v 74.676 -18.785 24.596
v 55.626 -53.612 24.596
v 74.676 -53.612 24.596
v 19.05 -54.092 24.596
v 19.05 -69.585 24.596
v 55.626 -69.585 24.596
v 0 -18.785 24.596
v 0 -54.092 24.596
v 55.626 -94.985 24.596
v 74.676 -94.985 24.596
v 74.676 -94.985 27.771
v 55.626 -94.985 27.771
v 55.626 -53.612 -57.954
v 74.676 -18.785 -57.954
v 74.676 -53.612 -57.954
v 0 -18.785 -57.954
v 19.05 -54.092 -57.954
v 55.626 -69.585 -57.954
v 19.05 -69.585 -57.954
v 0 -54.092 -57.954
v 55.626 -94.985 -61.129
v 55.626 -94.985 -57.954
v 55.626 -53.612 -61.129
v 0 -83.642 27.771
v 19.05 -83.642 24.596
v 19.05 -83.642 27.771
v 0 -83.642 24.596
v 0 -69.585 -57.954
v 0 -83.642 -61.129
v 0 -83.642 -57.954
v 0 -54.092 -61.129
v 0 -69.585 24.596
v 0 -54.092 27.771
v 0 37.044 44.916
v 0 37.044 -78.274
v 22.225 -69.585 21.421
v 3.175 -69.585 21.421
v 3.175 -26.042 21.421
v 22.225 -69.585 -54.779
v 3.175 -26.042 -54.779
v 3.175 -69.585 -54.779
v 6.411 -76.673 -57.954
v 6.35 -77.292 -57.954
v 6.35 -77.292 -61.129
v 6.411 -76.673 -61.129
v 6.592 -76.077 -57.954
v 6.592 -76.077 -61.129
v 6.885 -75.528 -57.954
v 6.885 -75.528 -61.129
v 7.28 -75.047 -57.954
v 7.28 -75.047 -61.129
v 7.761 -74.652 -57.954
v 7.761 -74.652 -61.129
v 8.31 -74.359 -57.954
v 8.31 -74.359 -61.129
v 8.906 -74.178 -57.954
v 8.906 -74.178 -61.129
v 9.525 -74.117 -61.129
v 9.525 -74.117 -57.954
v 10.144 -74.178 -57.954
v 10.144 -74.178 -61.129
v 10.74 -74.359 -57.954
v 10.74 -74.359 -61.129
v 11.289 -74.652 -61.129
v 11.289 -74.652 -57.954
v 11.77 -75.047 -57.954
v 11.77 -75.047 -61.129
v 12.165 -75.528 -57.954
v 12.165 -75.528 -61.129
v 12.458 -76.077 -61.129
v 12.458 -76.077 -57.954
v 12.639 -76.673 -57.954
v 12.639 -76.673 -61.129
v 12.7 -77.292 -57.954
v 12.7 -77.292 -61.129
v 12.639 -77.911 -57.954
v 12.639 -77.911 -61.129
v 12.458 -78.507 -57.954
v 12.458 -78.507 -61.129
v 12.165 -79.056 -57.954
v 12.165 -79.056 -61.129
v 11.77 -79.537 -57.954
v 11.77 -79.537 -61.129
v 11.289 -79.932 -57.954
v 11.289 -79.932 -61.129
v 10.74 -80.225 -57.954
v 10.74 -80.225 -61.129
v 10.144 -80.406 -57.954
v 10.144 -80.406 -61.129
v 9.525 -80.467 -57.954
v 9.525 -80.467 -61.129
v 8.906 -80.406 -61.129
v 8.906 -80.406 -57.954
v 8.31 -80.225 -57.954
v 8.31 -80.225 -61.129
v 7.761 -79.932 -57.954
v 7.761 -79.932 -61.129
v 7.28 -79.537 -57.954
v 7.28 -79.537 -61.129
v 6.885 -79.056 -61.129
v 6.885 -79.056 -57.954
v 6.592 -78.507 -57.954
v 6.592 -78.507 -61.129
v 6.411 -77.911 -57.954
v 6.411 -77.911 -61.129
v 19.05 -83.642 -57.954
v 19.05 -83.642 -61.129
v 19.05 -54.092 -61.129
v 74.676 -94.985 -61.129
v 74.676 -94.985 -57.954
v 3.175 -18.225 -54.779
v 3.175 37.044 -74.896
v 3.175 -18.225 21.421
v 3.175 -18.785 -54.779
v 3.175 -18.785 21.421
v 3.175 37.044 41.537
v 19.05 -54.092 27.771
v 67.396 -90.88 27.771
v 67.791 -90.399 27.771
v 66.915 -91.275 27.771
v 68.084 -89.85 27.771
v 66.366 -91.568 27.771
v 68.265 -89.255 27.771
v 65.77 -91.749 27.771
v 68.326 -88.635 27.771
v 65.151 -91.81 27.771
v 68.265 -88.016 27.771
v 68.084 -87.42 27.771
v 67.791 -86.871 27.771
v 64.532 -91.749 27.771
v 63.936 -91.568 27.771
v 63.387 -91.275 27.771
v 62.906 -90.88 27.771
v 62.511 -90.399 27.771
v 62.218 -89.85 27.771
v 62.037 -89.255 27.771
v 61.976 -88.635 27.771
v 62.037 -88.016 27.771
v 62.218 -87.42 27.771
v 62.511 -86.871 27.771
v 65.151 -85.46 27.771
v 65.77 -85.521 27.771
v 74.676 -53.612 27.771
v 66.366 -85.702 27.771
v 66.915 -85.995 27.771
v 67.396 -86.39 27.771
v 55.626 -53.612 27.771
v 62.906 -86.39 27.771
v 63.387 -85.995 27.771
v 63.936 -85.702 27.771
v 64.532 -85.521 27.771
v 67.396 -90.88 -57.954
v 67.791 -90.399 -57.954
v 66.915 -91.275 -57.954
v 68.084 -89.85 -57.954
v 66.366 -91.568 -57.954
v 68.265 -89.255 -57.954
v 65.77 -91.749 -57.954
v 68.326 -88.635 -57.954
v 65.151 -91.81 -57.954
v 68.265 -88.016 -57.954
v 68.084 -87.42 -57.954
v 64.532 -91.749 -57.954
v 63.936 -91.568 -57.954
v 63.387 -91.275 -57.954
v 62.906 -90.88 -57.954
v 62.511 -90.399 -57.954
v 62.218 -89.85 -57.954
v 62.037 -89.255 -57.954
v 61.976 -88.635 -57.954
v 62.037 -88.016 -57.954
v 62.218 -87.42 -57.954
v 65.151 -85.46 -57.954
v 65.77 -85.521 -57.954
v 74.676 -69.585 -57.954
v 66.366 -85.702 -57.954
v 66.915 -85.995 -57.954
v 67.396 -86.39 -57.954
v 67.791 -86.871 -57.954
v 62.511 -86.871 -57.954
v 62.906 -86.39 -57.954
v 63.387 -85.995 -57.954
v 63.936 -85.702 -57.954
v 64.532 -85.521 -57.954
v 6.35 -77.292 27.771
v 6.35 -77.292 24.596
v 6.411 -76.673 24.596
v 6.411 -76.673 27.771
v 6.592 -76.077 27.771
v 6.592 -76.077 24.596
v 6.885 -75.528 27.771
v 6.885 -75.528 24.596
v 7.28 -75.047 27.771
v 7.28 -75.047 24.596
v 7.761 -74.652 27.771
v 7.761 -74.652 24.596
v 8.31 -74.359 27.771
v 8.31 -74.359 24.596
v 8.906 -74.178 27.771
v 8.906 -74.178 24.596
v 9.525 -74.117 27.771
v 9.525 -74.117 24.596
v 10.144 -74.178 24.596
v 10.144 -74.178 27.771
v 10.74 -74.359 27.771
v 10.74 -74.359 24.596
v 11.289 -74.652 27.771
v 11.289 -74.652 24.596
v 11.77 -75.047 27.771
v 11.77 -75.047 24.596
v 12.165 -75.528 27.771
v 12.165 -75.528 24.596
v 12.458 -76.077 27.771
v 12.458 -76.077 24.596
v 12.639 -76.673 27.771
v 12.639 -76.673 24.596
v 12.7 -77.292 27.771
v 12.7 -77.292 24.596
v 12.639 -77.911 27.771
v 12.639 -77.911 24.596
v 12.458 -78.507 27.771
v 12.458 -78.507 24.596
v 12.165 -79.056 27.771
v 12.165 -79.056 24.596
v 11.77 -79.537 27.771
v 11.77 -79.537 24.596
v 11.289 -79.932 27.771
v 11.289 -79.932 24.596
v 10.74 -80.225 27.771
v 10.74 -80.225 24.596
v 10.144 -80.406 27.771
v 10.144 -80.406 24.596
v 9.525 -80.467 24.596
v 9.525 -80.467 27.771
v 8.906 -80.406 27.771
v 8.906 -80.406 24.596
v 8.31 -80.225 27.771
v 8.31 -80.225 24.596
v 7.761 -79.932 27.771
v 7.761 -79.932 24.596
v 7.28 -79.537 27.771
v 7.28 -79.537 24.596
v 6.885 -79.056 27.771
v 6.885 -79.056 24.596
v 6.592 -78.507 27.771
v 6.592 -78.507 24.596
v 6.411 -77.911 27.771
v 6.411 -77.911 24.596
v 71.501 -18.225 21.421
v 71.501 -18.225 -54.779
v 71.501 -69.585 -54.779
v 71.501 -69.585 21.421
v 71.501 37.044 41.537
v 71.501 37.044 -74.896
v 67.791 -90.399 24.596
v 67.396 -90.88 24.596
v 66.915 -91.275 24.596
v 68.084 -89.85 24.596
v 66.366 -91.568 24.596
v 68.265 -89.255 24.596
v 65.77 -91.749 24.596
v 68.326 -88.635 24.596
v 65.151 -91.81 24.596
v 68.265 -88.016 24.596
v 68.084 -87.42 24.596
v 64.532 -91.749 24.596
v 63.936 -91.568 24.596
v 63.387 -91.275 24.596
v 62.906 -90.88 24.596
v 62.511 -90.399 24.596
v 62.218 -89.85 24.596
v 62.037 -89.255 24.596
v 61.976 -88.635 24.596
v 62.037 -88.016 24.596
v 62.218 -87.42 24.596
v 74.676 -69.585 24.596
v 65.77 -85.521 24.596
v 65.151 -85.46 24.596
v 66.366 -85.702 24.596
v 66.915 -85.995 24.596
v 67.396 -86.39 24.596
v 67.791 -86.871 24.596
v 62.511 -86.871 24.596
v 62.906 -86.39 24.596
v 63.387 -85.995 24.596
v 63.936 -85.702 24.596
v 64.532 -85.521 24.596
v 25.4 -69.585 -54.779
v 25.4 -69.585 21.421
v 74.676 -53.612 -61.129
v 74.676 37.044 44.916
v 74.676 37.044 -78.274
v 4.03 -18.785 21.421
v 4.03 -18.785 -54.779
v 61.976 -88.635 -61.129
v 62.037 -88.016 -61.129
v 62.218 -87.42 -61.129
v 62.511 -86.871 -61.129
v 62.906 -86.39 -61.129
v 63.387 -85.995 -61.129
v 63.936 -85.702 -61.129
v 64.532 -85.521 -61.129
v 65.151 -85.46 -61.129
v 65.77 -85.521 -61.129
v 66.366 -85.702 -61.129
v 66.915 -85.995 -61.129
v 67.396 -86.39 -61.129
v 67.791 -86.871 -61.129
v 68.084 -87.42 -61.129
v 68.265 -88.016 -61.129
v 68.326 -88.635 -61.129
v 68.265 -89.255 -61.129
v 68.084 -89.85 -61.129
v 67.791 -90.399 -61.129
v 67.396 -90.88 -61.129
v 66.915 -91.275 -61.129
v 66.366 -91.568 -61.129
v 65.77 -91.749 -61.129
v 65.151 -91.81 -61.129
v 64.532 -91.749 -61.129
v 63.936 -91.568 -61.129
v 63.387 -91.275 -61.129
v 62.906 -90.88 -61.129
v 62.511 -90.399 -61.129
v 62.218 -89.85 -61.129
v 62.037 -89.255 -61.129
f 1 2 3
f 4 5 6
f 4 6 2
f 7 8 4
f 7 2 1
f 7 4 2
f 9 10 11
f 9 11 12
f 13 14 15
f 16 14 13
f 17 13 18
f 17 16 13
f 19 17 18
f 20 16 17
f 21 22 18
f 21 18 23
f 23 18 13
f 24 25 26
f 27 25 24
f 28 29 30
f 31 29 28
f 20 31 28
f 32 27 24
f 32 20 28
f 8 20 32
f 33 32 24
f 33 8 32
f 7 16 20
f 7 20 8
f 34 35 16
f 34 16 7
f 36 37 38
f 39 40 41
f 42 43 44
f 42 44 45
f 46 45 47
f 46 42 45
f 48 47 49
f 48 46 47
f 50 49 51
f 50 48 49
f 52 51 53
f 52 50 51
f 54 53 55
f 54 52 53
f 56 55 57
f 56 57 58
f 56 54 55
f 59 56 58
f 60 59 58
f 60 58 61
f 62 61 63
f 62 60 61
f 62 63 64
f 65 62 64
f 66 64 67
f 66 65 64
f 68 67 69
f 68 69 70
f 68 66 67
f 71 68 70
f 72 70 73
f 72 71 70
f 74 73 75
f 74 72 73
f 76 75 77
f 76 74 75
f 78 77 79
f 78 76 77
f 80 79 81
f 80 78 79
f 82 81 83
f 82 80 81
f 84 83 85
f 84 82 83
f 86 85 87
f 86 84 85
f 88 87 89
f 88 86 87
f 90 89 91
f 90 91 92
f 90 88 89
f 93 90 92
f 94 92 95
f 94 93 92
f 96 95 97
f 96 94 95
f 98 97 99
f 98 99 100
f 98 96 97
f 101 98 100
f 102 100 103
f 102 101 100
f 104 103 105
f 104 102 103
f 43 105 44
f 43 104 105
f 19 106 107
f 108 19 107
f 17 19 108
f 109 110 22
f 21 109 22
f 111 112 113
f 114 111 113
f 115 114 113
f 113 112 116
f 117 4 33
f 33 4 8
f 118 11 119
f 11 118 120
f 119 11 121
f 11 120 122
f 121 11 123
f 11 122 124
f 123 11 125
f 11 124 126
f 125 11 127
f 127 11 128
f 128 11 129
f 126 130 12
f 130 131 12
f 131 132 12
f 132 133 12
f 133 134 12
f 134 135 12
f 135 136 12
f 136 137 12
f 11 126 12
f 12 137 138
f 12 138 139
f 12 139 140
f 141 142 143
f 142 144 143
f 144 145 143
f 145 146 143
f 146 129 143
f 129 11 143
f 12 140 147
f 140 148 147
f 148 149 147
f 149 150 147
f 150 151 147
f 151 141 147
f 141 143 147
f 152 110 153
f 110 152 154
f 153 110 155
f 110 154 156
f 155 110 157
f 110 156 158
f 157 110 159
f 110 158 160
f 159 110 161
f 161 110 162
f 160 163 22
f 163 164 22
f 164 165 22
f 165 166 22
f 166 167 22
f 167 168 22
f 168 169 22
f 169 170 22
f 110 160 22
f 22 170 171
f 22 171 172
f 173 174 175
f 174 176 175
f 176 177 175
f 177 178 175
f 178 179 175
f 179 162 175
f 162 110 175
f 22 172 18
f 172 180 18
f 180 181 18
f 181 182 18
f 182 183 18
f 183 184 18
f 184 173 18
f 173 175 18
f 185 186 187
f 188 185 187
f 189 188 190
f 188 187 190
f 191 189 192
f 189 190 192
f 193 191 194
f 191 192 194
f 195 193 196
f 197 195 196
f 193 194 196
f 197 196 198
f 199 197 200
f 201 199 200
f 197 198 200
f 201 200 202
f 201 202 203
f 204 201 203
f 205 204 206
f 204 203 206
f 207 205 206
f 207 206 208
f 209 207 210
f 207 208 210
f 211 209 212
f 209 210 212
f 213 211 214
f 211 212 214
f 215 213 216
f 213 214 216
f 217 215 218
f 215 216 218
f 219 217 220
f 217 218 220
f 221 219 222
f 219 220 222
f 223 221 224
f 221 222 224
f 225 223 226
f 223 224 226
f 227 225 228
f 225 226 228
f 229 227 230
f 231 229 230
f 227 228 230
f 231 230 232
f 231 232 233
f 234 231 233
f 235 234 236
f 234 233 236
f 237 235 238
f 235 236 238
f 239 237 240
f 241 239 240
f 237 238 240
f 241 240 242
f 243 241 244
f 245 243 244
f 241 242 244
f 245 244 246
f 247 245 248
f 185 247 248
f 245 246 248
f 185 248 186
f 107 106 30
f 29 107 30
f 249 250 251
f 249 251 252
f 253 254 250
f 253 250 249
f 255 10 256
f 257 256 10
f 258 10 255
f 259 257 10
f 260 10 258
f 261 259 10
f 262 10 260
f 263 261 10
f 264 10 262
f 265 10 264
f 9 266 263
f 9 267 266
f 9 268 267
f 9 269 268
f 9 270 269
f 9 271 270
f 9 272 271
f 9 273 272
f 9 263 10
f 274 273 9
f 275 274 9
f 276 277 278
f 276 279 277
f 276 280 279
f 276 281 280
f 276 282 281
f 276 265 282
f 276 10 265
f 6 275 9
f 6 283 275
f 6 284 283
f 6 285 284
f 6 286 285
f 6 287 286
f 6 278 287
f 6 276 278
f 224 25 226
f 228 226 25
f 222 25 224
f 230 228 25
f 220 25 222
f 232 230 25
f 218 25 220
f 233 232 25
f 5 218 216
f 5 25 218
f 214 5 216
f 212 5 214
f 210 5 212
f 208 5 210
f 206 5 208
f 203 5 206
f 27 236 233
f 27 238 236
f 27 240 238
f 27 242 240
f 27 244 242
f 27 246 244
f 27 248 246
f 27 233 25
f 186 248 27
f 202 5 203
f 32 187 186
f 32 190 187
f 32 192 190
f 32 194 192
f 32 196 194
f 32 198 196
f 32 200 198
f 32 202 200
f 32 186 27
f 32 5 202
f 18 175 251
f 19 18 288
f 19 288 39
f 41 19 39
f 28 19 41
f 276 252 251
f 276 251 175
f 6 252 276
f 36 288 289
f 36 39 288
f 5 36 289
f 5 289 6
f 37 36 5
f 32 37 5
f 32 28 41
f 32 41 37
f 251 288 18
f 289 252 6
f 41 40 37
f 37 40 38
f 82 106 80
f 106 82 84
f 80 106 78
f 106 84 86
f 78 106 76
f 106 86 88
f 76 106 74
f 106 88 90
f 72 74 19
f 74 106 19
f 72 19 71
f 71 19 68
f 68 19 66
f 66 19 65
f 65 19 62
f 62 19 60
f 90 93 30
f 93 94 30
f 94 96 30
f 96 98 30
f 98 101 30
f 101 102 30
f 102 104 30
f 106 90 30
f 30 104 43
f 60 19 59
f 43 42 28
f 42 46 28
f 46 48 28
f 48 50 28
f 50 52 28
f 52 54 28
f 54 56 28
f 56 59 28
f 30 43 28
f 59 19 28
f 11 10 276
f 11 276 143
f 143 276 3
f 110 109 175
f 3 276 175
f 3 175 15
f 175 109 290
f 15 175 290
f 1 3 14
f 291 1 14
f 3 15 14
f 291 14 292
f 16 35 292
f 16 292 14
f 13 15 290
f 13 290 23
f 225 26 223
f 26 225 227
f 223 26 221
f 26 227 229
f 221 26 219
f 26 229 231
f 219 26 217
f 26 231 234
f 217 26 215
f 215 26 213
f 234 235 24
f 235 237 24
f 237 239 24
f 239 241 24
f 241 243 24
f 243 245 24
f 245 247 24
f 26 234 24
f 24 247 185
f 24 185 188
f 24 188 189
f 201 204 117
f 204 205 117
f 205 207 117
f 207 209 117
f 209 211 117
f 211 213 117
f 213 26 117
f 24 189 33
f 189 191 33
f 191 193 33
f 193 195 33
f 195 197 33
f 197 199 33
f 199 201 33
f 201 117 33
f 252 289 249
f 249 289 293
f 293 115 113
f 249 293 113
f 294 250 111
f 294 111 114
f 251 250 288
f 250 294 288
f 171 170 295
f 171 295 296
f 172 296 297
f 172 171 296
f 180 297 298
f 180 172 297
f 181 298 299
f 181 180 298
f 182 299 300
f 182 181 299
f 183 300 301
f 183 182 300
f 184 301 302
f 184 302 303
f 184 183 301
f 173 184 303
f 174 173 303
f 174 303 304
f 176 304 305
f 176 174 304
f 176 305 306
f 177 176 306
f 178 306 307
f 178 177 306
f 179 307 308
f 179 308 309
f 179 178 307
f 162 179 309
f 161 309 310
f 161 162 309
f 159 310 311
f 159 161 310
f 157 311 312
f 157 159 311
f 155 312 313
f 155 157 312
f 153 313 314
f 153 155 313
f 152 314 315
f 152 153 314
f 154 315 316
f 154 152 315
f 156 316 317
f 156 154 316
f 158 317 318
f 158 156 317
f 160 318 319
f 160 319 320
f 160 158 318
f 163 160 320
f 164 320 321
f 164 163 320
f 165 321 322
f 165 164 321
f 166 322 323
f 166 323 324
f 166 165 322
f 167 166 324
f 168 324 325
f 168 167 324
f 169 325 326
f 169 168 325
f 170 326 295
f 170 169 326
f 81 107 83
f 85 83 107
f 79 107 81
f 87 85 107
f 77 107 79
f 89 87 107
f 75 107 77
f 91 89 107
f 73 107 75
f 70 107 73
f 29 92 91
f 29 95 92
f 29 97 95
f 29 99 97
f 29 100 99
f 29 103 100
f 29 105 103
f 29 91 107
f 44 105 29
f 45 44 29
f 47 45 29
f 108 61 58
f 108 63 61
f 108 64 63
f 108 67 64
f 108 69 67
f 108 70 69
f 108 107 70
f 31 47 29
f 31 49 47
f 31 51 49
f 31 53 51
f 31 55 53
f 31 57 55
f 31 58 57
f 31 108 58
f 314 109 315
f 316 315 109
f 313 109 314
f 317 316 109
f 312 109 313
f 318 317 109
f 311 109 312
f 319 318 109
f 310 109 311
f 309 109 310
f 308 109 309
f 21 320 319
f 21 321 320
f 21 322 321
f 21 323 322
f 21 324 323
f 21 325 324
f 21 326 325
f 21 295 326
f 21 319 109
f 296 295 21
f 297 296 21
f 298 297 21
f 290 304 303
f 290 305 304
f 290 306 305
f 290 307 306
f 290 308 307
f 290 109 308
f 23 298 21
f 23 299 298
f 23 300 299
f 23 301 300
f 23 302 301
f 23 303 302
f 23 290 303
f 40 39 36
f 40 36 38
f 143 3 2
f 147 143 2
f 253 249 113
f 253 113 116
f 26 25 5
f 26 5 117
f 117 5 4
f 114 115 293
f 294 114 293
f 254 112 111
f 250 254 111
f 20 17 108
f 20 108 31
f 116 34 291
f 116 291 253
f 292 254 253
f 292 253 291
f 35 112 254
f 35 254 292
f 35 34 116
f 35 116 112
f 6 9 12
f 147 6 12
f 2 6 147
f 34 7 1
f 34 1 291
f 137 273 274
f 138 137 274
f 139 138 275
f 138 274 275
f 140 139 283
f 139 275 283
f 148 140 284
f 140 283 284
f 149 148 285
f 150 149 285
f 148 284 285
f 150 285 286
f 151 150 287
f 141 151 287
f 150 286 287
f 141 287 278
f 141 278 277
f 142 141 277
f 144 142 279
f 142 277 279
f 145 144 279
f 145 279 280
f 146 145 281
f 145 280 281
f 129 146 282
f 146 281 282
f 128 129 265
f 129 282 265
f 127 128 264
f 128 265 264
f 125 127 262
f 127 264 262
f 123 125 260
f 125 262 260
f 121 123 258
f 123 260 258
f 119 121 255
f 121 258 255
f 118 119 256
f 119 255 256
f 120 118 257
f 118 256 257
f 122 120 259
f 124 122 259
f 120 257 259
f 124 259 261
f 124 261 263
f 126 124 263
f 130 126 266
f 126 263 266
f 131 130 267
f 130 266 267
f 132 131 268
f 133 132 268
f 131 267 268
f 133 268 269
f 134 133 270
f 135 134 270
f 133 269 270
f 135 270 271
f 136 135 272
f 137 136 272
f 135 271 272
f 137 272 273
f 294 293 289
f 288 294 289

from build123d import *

# Parameters (mm, degrees)
BOSS_EXTRUDE2_DEPTH = 74.676
SHELL1_T            = -3.175
BOSS_EXTRUDE3_REACH = 101.695
SKETCH7_W           = 19.05
SKETCH7_H           = 41.37312771
SKETCH7_R           = 3.175
SKETCH7_H_2         = 29.549685012
BOSS_EXTRUDE4_DEPTH = 3.175


with BuildPart() as part:
    # Sketch4 → Boss-Extrude2 (new body)
    with BuildSketch(Plane(origin=(0, 0, 0), x_dir=(0, 0, -1), z_dir=(1, 0, 0))):
        Polygon((-44.915630504, 37.043578511), (78.274369496, 37.043578511), (57.954369496, -18.785162652), (57.954369496, -69.585162652), (-24.595630504, -69.585162652), (-24.595630504, -18.785162652), align=None)
    extrude(amount=BOSS_EXTRUDE2_DEPTH)

    # Shell1
    shell1_openings = [part.faces().sort_by_distance(p)[0] for p in [
        (37.338, 37.043578511, -16.679369496),
        (37.338, -69.585162652, -16.679369496),
    ]]
    offset(amount=SHELL1_T, openings=shell1_openings, kind=Kind.INTERSECTION)

    # Sketch6 → Boss-Extrude3 (add, up to next)
    with BuildSketch(Plane(origin=(0, 0, 21.420630504), x_dir=(-1, 0, 0), z_dir=(0, 0, -1)), mode=Mode.PRIVATE) as boss_extrude3_sk1:
        Polygon((-4.030024393, -18.785162652), (-25.4, -69.585162652), (-22.225, -69.585162652), (0, -18.785162652), align=None)
    boss_extrude3_tool1 = extrude(boss_extrude3_sk1.sketch, amount=BOSS_EXTRUDE3_REACH, mode=Mode.PRIVATE) - part.part
    add(boss_extrude3_tool1.solids().sort_by_distance((12.482636, -43.180418, 21.420631))[0])

    # Sketch7 → Boss-Extrude4 (add)
    with BuildSketch(Plane(origin=(0, 0, -57.954369496), x_dir=(-1, 0, 0), z_dir=(0, 0, -1))):
        with Locations((-65.151, -74.298598797)):
            Rectangle(SKETCH7_W, SKETCH7_H)
        with Locations((-65.151, -88.635162652)):
            Circle(SKETCH7_R, mode=Mode.SUBTRACT)
        with Locations((-9.525, -68.867228229)):
            Rectangle(SKETCH7_W, SKETCH7_H_2)
        with Locations((-9.525, -77.292070735)):
            Circle(SKETCH7_R, mode=Mode.SUBTRACT)
    boss_extrude4 = extrude(amount=BOSS_EXTRUDE4_DEPTH)

    # Mirror1: Boss-Extrude4 across plane
    add(boss_extrude4.mirror(Plane(origin=(0, 0, -16.679369496), x_dir=(1, 0, 0), z_dir=(0, 0, -1))))


solid = part.part
